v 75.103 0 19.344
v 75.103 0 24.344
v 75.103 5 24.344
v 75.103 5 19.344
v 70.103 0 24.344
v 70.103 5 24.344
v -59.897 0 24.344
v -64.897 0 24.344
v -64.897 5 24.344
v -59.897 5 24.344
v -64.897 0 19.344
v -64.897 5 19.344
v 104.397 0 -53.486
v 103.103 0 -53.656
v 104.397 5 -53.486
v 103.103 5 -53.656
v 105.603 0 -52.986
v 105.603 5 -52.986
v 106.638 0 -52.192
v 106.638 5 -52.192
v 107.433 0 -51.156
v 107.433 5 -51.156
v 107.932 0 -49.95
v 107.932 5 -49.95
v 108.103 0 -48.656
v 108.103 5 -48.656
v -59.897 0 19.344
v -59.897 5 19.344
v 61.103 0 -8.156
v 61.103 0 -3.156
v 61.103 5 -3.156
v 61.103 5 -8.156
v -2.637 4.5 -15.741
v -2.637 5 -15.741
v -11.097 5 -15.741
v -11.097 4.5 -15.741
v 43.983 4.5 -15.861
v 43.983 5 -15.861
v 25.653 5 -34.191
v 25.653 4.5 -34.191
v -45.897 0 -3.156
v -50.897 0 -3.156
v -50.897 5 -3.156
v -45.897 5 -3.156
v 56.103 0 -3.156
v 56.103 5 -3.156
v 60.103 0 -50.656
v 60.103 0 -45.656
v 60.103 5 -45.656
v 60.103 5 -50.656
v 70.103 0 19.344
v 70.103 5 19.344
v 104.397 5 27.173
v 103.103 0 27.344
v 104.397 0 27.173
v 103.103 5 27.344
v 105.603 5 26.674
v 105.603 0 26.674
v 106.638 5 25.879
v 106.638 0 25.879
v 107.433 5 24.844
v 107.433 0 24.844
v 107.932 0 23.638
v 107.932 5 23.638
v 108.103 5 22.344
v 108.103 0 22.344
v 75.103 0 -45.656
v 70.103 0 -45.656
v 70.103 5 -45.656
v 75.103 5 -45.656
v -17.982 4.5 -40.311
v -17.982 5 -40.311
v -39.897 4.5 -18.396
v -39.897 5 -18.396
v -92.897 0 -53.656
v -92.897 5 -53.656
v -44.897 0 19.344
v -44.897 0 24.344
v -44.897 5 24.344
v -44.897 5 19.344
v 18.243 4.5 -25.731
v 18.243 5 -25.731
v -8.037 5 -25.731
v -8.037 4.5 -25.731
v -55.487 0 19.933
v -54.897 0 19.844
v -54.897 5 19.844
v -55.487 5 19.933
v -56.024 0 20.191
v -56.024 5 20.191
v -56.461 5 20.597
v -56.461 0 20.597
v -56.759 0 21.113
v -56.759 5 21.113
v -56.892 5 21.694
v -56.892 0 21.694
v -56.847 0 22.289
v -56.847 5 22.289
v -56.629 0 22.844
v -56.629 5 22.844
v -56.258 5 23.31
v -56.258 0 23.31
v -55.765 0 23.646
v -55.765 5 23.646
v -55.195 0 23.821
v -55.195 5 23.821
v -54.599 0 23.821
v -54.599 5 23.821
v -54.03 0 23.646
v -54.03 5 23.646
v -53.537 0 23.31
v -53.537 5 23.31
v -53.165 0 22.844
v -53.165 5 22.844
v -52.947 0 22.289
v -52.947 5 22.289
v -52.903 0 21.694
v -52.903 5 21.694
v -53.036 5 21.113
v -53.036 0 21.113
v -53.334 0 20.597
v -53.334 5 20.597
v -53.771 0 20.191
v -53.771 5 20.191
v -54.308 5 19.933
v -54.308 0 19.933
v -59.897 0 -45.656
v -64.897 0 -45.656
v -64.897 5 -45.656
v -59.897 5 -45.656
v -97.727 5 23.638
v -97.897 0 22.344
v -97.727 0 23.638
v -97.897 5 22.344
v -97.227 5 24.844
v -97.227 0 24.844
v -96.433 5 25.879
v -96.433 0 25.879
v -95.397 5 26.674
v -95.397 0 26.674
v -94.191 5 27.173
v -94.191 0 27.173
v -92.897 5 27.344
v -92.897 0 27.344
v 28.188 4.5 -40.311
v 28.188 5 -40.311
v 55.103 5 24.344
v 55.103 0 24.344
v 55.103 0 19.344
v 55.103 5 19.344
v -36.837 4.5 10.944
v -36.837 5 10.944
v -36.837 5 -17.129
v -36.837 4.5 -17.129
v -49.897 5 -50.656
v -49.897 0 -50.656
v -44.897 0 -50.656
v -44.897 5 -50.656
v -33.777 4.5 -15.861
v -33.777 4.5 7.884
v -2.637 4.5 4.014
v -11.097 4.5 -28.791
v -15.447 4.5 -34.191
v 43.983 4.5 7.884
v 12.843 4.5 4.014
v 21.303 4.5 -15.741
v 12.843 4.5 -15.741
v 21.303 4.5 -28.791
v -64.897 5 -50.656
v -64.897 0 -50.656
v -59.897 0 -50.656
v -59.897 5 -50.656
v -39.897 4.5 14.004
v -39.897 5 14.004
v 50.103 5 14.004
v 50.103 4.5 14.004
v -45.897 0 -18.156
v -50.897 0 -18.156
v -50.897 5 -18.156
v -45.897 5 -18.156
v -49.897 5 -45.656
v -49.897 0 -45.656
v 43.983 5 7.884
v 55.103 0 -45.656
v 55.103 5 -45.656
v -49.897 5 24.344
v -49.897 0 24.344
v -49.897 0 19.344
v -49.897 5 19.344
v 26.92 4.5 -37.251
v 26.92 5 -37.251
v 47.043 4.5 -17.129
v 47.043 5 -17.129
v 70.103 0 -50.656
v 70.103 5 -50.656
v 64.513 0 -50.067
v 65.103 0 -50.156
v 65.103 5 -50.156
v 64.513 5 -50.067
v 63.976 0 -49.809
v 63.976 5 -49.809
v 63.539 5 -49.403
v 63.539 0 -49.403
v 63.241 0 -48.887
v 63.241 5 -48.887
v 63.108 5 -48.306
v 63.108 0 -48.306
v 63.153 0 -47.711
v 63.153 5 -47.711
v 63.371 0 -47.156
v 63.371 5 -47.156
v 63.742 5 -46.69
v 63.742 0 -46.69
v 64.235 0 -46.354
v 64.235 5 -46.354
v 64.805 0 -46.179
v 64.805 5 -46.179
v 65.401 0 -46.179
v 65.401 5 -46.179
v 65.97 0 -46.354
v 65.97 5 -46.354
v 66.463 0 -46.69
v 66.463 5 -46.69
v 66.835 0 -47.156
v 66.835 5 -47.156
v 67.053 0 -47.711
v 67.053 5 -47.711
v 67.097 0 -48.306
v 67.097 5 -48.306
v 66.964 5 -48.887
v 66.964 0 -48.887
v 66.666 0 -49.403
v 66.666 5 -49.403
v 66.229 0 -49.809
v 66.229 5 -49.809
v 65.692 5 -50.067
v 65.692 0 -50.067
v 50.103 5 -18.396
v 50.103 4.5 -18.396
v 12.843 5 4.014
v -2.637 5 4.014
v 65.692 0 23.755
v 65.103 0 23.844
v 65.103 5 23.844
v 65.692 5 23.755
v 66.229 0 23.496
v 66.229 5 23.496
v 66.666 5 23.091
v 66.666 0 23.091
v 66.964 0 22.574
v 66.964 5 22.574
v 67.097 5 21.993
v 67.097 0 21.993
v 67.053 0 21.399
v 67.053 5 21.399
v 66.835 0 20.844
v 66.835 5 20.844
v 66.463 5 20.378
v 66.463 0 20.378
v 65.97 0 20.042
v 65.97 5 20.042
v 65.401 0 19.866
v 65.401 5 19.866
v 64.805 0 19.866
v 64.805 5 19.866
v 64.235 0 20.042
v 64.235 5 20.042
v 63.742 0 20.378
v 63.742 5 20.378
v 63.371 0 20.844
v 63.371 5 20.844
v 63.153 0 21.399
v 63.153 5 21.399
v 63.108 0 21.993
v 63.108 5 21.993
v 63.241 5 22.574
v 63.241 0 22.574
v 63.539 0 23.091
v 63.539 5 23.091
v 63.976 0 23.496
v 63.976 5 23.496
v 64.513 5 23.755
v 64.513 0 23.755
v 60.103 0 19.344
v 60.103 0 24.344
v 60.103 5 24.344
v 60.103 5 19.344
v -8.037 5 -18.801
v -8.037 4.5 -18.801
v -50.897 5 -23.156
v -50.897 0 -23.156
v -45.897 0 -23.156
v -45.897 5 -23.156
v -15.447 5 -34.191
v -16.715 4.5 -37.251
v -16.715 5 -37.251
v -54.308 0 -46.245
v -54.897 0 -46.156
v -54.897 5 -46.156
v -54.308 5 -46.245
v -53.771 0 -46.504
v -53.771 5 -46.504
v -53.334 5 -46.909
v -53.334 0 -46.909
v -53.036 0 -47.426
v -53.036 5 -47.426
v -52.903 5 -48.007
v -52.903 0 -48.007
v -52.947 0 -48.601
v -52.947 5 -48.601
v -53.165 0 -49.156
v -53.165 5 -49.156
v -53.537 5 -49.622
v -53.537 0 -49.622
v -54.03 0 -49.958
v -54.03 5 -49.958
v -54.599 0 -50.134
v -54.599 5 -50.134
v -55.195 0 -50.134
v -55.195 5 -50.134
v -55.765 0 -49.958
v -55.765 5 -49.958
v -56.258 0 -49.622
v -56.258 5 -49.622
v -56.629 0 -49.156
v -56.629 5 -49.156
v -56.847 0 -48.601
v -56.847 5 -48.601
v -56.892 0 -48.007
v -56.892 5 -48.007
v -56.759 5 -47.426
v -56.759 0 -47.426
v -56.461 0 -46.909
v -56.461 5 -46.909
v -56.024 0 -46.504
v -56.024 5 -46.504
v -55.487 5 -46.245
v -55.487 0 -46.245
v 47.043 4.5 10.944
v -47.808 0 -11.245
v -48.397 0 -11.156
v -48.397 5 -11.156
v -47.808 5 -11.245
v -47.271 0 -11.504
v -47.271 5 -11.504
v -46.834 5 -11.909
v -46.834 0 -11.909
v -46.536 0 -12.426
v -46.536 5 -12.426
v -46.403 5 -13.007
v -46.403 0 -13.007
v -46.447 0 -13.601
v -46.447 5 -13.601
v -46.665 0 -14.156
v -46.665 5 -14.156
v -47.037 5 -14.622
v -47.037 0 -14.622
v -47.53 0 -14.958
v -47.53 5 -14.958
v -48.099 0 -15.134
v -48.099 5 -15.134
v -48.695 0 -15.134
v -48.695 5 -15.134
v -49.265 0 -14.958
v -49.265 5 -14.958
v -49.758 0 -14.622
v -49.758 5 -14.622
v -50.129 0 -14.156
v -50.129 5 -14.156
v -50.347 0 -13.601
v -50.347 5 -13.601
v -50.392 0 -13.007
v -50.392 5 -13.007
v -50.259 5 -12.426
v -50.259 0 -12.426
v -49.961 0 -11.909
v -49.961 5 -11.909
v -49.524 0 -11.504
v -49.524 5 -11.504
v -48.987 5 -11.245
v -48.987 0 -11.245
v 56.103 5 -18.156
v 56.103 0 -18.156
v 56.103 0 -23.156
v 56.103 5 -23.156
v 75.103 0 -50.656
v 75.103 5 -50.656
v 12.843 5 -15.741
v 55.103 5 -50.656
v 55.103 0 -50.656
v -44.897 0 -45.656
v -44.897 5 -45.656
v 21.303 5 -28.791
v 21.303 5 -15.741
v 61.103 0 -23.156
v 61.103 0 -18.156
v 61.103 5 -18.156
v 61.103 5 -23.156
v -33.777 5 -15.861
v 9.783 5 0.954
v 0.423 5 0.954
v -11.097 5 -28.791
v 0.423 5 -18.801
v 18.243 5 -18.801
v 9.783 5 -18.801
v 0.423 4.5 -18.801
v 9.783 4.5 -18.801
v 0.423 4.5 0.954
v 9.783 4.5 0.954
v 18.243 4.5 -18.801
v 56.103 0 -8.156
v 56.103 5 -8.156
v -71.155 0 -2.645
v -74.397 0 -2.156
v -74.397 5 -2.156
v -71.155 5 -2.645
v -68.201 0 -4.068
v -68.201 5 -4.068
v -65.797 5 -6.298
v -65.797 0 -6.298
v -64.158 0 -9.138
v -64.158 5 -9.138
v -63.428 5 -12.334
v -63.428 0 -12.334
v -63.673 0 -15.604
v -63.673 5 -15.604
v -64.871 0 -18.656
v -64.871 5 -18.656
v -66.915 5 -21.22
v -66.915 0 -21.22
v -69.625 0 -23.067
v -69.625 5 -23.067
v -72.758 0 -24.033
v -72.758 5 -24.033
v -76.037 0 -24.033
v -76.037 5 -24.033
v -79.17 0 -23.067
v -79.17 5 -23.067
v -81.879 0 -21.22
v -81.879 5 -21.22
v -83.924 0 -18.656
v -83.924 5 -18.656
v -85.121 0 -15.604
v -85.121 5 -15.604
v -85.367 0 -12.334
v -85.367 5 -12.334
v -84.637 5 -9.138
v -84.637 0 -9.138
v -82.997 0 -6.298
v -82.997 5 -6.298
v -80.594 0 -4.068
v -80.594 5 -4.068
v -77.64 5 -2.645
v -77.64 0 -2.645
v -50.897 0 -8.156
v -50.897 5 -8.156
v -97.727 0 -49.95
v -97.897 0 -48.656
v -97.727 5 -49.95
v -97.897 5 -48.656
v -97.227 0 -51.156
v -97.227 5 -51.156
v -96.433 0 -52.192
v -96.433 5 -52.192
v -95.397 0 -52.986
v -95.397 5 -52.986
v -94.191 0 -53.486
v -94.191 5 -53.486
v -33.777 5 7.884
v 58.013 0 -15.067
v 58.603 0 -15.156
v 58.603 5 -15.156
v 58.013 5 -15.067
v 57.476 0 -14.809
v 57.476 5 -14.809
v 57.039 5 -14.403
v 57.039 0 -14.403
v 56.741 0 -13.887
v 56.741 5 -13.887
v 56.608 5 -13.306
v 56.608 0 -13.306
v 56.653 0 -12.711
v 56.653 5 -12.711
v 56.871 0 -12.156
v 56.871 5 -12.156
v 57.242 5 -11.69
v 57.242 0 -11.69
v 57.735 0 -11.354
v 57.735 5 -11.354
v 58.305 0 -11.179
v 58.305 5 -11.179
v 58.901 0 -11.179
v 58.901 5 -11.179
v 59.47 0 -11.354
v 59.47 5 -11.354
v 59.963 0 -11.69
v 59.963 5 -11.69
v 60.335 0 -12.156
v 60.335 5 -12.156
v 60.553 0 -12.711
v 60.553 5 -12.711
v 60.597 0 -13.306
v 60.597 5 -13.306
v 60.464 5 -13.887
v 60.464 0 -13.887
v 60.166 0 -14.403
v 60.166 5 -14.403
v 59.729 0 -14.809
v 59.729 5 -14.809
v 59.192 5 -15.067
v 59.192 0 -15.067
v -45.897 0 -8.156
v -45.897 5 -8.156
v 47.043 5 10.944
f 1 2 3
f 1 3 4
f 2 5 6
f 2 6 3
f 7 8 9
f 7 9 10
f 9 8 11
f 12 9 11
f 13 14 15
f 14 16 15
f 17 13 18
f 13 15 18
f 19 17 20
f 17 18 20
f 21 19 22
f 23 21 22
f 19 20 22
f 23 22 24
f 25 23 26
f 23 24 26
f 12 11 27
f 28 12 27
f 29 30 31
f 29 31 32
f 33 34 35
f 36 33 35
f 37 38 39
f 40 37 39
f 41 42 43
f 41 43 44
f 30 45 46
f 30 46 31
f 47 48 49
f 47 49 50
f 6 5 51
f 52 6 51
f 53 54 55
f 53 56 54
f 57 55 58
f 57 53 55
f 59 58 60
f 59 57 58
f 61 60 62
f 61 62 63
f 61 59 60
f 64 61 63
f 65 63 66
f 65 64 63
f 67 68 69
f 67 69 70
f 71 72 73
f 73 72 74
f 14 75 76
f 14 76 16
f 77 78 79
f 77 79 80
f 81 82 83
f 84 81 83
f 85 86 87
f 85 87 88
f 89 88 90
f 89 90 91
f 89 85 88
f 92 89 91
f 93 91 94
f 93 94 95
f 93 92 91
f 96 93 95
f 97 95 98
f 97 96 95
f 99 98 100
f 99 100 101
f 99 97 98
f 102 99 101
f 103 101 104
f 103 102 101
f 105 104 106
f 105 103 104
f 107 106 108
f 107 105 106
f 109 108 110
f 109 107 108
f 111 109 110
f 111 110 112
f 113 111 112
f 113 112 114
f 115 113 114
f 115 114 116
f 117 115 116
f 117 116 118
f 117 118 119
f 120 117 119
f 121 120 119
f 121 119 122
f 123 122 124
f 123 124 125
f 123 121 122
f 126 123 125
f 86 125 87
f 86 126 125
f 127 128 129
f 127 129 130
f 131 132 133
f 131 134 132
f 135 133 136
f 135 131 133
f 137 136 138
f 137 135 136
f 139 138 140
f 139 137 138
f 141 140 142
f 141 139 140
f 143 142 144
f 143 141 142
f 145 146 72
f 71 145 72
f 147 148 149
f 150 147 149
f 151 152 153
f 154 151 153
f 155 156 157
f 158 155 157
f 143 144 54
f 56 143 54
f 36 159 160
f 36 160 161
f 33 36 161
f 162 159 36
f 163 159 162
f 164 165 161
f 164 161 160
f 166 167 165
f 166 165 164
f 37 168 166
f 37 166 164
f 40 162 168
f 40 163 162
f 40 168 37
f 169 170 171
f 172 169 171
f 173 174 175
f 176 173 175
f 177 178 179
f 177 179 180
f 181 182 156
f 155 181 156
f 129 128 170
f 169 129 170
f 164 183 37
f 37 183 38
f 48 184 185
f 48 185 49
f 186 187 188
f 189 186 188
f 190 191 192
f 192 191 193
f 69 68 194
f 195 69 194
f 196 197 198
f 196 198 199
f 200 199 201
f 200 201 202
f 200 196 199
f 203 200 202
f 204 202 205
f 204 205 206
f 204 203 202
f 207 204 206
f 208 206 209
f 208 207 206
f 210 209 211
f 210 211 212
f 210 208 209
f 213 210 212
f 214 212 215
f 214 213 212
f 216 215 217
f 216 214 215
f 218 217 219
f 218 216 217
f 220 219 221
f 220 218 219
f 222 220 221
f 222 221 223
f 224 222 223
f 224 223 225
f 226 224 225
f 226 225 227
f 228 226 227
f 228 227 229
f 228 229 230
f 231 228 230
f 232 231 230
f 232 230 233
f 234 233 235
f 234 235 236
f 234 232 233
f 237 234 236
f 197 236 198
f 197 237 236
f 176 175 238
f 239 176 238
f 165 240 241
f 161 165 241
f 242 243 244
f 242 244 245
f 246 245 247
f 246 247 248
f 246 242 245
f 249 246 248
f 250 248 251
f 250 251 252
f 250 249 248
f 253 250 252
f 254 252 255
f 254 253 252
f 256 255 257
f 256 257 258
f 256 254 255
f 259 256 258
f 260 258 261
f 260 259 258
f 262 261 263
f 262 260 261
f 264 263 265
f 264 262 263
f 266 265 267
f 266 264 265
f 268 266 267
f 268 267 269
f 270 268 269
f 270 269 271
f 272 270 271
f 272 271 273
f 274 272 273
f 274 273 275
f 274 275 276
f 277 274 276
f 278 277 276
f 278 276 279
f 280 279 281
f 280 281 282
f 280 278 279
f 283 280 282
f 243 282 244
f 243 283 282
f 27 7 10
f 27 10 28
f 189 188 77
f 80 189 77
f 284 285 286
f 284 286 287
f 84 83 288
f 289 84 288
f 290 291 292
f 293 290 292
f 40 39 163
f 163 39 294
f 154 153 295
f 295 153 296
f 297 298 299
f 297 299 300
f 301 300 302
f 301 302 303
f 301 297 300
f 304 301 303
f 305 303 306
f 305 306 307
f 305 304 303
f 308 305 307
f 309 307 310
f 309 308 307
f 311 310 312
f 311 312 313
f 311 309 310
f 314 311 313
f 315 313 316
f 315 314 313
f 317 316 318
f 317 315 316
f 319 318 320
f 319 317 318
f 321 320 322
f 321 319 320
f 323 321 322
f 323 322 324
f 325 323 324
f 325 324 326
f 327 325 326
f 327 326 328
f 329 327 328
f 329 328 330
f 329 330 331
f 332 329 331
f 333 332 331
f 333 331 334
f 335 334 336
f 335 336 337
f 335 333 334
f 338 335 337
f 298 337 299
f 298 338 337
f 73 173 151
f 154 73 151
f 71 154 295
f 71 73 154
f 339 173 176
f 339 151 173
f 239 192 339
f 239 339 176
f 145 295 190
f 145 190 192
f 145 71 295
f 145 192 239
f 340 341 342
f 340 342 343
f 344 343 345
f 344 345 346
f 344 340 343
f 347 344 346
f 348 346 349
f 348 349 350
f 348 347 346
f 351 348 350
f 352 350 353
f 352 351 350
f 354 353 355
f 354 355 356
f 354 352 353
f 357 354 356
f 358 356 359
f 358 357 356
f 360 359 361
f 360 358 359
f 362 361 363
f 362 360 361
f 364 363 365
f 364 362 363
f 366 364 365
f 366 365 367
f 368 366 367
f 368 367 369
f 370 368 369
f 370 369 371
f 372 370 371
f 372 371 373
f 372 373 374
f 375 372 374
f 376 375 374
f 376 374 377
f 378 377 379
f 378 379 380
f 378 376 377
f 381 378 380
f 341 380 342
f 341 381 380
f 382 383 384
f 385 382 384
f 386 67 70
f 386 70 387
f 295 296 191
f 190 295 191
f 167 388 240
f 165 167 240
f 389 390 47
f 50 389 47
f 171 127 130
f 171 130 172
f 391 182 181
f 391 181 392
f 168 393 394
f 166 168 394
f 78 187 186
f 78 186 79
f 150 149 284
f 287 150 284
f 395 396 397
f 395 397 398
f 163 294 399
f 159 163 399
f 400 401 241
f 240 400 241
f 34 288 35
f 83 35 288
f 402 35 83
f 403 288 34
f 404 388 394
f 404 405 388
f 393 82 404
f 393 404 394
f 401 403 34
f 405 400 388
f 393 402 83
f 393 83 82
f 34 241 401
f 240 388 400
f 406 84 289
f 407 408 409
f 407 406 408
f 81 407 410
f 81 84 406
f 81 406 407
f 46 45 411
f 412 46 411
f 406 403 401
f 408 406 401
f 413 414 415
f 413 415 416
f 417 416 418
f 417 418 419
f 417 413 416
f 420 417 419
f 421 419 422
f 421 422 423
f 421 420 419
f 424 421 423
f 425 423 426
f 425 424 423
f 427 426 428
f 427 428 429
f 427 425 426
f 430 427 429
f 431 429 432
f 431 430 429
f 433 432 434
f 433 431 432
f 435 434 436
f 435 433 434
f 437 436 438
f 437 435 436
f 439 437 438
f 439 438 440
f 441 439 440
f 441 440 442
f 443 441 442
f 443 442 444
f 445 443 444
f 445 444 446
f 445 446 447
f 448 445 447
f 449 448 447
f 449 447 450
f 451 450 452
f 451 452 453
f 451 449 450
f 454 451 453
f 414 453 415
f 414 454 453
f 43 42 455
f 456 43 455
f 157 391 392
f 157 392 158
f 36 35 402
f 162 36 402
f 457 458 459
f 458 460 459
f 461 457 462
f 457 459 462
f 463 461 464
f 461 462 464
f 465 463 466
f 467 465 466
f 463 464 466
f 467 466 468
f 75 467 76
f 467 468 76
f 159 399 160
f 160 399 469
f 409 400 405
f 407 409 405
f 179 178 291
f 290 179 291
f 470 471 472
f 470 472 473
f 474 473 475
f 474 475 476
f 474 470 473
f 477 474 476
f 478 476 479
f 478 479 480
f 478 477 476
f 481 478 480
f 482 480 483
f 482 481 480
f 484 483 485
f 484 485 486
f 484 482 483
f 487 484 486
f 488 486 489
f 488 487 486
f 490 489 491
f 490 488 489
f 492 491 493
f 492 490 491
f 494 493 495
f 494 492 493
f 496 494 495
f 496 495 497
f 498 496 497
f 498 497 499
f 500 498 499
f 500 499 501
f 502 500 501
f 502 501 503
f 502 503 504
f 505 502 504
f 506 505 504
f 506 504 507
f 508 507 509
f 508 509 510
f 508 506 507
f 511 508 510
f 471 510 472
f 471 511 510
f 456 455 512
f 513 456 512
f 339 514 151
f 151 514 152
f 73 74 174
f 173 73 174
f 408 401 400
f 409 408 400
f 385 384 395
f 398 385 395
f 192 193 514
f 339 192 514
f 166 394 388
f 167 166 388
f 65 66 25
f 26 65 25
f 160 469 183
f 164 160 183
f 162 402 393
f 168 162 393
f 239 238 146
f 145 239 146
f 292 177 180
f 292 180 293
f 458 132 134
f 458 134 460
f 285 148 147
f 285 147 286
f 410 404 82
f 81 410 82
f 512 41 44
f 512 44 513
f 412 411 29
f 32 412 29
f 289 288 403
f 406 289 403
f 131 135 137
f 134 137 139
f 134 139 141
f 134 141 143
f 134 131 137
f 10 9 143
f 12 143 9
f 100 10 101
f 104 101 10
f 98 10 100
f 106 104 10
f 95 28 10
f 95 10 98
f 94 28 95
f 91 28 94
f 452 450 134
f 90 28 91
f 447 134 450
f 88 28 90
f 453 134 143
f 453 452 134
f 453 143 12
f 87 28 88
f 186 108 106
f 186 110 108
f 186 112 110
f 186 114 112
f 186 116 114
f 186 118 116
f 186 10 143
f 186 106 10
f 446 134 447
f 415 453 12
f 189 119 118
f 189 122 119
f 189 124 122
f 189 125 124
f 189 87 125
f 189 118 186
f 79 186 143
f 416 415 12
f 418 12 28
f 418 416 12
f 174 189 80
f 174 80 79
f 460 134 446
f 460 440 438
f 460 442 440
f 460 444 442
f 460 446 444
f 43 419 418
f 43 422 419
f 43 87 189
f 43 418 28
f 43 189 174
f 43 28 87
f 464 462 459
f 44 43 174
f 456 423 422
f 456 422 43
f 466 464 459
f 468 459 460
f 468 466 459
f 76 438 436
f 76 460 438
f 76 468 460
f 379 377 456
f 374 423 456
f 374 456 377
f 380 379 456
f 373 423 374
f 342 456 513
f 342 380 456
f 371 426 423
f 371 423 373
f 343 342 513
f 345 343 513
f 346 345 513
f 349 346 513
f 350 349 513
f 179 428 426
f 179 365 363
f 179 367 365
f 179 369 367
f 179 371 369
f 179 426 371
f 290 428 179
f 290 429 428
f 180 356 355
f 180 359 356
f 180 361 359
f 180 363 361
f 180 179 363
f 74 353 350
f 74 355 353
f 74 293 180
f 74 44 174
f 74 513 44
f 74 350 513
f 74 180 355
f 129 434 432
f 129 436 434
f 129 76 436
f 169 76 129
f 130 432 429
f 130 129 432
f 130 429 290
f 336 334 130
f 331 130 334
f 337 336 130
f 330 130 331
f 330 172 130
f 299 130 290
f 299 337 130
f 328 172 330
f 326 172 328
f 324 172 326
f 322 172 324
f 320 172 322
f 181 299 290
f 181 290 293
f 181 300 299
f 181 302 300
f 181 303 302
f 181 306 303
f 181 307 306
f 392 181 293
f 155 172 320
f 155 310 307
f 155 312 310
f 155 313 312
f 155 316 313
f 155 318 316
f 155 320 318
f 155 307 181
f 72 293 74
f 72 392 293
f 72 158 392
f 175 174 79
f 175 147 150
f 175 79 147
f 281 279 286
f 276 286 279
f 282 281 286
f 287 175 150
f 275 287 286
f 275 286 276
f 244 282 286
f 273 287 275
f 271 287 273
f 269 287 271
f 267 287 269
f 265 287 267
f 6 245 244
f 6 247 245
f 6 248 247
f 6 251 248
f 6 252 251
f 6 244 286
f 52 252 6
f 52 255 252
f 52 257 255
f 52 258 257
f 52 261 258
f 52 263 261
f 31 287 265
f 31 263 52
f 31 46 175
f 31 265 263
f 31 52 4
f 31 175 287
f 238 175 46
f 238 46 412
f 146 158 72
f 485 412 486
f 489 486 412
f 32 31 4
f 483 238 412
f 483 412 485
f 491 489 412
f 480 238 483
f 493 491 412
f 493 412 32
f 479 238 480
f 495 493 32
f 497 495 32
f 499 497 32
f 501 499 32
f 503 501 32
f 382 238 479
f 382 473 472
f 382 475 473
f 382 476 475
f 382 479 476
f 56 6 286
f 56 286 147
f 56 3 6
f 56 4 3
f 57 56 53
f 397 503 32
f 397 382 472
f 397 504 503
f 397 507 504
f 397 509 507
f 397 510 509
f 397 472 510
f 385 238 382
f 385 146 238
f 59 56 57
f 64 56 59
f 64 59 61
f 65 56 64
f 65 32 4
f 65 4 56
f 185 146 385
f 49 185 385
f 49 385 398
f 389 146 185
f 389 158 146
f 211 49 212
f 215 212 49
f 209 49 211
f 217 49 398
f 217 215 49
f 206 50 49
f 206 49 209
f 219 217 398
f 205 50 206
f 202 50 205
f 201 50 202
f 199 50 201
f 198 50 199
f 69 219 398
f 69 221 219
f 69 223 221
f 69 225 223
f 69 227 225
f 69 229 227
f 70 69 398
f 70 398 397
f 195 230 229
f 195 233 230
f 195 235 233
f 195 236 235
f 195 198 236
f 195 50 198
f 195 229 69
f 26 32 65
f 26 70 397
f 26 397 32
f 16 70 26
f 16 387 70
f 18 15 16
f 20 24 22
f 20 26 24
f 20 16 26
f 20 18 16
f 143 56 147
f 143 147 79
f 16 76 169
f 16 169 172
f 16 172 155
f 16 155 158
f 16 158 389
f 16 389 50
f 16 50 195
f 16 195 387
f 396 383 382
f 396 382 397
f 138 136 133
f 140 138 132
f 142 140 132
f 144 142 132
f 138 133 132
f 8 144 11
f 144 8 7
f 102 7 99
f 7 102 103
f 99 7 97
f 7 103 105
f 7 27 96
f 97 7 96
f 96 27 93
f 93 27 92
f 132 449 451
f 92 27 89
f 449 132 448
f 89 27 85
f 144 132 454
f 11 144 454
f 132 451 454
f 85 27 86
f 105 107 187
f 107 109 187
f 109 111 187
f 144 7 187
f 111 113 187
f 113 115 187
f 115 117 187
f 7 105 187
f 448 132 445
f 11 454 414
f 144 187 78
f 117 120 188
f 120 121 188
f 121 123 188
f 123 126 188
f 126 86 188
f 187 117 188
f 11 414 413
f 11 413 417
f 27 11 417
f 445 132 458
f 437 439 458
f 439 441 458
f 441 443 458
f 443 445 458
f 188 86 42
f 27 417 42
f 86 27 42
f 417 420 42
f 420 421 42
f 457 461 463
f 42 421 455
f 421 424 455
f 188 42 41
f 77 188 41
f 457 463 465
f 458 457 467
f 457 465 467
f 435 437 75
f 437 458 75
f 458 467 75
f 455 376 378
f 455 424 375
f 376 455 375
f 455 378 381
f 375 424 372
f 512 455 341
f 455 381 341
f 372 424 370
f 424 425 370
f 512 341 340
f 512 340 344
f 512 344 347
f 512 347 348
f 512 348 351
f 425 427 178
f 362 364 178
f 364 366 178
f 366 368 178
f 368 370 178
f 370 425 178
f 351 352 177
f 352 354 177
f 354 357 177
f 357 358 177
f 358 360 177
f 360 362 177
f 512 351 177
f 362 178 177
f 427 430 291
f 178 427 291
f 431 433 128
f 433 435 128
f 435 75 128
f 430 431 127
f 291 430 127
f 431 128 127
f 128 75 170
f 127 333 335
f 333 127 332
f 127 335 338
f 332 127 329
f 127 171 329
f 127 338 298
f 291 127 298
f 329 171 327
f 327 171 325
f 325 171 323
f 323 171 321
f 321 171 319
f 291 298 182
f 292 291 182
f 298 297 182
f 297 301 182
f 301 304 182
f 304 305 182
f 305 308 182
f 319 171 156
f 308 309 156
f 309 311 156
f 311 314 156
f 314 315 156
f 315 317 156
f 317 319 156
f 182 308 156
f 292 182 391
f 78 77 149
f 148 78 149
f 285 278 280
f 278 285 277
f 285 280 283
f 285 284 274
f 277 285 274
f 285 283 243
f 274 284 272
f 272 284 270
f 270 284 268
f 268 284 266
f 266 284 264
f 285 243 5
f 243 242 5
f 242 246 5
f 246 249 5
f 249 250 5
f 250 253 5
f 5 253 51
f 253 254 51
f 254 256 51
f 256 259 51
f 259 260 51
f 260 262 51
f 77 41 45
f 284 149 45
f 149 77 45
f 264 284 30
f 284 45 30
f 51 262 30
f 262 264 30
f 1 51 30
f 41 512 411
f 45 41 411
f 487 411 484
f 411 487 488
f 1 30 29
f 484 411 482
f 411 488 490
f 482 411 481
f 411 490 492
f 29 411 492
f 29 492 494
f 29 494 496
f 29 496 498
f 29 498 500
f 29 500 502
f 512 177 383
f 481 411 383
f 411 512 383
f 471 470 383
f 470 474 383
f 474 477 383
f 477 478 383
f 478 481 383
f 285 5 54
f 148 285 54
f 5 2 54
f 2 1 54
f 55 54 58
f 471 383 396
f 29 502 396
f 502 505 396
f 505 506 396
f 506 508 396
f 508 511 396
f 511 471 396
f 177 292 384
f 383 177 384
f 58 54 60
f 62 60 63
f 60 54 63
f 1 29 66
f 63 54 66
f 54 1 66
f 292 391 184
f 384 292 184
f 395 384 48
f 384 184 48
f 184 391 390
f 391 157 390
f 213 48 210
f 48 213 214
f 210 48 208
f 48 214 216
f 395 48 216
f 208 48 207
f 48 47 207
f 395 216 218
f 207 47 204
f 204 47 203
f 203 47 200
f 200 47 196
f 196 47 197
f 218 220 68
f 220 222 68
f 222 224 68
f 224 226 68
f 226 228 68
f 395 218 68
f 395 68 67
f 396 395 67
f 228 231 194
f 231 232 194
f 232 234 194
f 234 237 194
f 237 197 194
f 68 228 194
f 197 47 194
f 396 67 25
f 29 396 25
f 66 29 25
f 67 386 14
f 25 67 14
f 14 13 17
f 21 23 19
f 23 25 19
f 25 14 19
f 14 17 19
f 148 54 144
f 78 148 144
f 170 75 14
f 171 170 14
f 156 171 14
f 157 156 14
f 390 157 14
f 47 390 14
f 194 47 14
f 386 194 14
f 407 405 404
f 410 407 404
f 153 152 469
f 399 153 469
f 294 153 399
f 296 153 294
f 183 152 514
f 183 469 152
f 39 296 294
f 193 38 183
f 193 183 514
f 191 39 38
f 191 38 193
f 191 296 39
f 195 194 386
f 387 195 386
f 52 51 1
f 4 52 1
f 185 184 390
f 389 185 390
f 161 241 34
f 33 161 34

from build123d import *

# Parameters (mm, degrees)
SKETCH1_W           = 206
SKETCH1_H           = 81
SKETCH1_R           = 2
SKETCH1_R_2         = 11
SKETCH1_W_2         = 5
SKETCH1_H_2         = 5
BOSS_EXTRUDE1_DEPTH = 5
FILLET1_R           = 5
CUT_EXTRUDE1_DEPTH  = 0.5


with BuildPart() as part:
    # Sketch1 → Boss-Extrude1 (new body)
    with BuildSketch(Plane(origin=(0, 0, 0), x_dir=(1, 0, 0), z_dir=(0, 1, 0))):
        with Locations((5.102707087, 13.156325227)):
            Rectangle(SKETCH1_W, SKETCH1_H)
        with Locations(Location((-54.897292913, 48.156325227, 0), (0, 0, 270))):
            Circle(SKETCH1_R, mode=Mode.SUBTRACT)
        with Locations(Location((-54.897292913, -21.843674773, 0), (0, 0, 90))):
            Circle(SKETCH1_R, mode=Mode.SUBTRACT)
        with Locations(Location((65.102707087, -21.843674773, 0), (0, 0, 270))):
            Circle(SKETCH1_R, mode=Mode.SUBTRACT)
        with Locations(Location((65.102707087, 48.156325227, 0), (0, 0, 90))):
            Circle(SKETCH1_R, mode=Mode.SUBTRACT)
        with Locations(Location((-48.397292913, 13.156325227, 0), (0, 0, 270))):
            Circle(SKETCH1_R, mode=Mode.SUBTRACT)
        with Locations(Location((58.602707087, 13.156325227, 0), (0, 0, 90))):
            Circle(SKETCH1_R, mode=Mode.SUBTRACT)
        with Locations(Location((-74.397292913, 13.156325227, 0), (0, 0, 270))):
            Circle(SKETCH1_R_2, mode=Mode.SUBTRACT)
        with Locations((57.602707087, 48.156325227)):
            Rectangle(SKETCH1_W_2, SKETCH1_H_2, mode=Mode.SUBTRACT)
        with Locations((-62.397292913, 48.156325227)):
            Rectangle(SKETCH1_W_2, SKETCH1_H_2, mode=Mode.SUBTRACT)
        with Locations((-47.397292913, 48.156325227)):
            Rectangle(SKETCH1_W_2, SKETCH1_H_2, mode=Mode.SUBTRACT)
        with Locations((72.602707087, 48.156325227)):
            Rectangle(SKETCH1_W_2, SKETCH1_H_2, mode=Mode.SUBTRACT)
        with Locations((72.602707087, -21.843674773)):
            Rectangle(SKETCH1_W_2, SKETCH1_H_2, mode=Mode.SUBTRACT)
        with Locations((57.602707087, -21.843674773)):
            Rectangle(SKETCH1_W_2, SKETCH1_H_2, mode=Mode.SUBTRACT)
        with Locations((-47.397292913, -21.843674773)):
            Rectangle(SKETCH1_W_2, SKETCH1_H_2, mode=Mode.SUBTRACT)
        with Locations((-62.397292913, -21.843674773)):
            Rectangle(SKETCH1_W_2, SKETCH1_H_2, mode=Mode.SUBTRACT)
        with Locations((-48.397292913, 20.656325227)):
            Rectangle(SKETCH1_W_2, SKETCH1_H_2, mode=Mode.SUBTRACT)
        with Locations((-48.397292913, 5.656325227)):
            Rectangle(SKETCH1_W_2, SKETCH1_H_2, mode=Mode.SUBTRACT)
        with Locations((58.602707087, 5.656325227)):
            Rectangle(SKETCH1_W_2, SKETCH1_H_2, mode=Mode.SUBTRACT)
        with Locations((58.602707087, 20.656325227)):
            Rectangle(SKETCH1_W_2, SKETCH1_H_2, mode=Mode.SUBTRACT)
    extrude(amount=BOSS_EXTRUDE1_DEPTH)

    # Fillet1
    fillet1_edges = [part.edges().sort_by_distance(p)[0] for p in [
        (-97.897292913, 2.5, -53.656325227),
        (108.102707087, 2.5, -53.656325227),
        (108.102707087, 2.5, 27.343674773),
        (-97.897292913, 2.5, 27.343674773),
    ]]
    fillet(fillet1_edges, radius=FILLET1_R)

    # Sketch2 → Cut-Extrude1 (cut)
    with BuildSketch(Plane(origin=(0, 5, 0), x_dir=(1, 0, 0), z_dir=(0, 1, 0))):
        Polygon((-39.897292913, 18.396325227), (-39.897292913, -14.003674773), (5.102707087, -14.003674773), (5.102707087, -10.943674773), (-36.837292913, -10.943674773), (-36.837292913, 17.128831726), (-16.714799412, 37.251325227), (5.102707087, 37.251325227), (5.102707087, 40.311325227), (-17.982292913, 40.311325227), align=None)
        Polygon((5.102707087, -10.943674773), (5.102707087, -14.003674773), (50.102707087, -14.003674773), (50.102707087, 18.396325227), (28.187707087, 40.311325227), (5.102707087, 40.311325227), (5.102707087, 37.251325227), (26.920213586, 37.251325227), (47.042707087, 17.128831726), (47.042707087, -10.943674773), align=None)
        Polygon((5.102707087, -4.013674773), (5.102707087, -7.883674773), (43.982707087, -7.883674773), (43.982707087, 15.861338225), (25.652720085, 34.191325227), (5.102707087, 34.191325227), (5.102707087, 28.791325227), (21.302707087, 28.791325227), (21.302707087, 15.741325227), (12.842707087, 15.741325227), (12.842707087, -4.013674773), align=None)
        Polygon((-33.777292913, -7.883674773), (5.102707087, -7.883674773), (5.102707087, -4.013674773), (-2.637292913, -4.013674773), (-2.637292913, 15.741325227), (-11.097292913, 15.741325227), (-11.097292913, 28.791325227), (5.102707087, 28.791325227), (5.102707087, 34.191325227), (-15.447305912, 34.191325227), (-33.777292913, 15.861338225), align=None)
        Polygon((0.422707087, -0.953674773), (5.102707087, -0.953674773), (5.102707087, 25.731325227), (-8.037292913, 25.731325227), (-8.037292913, 18.801325227), (0.422707087, 18.801325227), align=None)
        Polygon((5.102707087, 25.731325227), (5.102707087, -0.953674773), (9.782707087, -0.953674773), (9.782707087, 18.801325227), (18.242707087, 18.801325227), (18.242707087, 25.731325227), align=None)
    extrude(amount=-CUT_EXTRUDE1_DEPTH, mode=Mode.SUBTRACT)


solid = part.part
